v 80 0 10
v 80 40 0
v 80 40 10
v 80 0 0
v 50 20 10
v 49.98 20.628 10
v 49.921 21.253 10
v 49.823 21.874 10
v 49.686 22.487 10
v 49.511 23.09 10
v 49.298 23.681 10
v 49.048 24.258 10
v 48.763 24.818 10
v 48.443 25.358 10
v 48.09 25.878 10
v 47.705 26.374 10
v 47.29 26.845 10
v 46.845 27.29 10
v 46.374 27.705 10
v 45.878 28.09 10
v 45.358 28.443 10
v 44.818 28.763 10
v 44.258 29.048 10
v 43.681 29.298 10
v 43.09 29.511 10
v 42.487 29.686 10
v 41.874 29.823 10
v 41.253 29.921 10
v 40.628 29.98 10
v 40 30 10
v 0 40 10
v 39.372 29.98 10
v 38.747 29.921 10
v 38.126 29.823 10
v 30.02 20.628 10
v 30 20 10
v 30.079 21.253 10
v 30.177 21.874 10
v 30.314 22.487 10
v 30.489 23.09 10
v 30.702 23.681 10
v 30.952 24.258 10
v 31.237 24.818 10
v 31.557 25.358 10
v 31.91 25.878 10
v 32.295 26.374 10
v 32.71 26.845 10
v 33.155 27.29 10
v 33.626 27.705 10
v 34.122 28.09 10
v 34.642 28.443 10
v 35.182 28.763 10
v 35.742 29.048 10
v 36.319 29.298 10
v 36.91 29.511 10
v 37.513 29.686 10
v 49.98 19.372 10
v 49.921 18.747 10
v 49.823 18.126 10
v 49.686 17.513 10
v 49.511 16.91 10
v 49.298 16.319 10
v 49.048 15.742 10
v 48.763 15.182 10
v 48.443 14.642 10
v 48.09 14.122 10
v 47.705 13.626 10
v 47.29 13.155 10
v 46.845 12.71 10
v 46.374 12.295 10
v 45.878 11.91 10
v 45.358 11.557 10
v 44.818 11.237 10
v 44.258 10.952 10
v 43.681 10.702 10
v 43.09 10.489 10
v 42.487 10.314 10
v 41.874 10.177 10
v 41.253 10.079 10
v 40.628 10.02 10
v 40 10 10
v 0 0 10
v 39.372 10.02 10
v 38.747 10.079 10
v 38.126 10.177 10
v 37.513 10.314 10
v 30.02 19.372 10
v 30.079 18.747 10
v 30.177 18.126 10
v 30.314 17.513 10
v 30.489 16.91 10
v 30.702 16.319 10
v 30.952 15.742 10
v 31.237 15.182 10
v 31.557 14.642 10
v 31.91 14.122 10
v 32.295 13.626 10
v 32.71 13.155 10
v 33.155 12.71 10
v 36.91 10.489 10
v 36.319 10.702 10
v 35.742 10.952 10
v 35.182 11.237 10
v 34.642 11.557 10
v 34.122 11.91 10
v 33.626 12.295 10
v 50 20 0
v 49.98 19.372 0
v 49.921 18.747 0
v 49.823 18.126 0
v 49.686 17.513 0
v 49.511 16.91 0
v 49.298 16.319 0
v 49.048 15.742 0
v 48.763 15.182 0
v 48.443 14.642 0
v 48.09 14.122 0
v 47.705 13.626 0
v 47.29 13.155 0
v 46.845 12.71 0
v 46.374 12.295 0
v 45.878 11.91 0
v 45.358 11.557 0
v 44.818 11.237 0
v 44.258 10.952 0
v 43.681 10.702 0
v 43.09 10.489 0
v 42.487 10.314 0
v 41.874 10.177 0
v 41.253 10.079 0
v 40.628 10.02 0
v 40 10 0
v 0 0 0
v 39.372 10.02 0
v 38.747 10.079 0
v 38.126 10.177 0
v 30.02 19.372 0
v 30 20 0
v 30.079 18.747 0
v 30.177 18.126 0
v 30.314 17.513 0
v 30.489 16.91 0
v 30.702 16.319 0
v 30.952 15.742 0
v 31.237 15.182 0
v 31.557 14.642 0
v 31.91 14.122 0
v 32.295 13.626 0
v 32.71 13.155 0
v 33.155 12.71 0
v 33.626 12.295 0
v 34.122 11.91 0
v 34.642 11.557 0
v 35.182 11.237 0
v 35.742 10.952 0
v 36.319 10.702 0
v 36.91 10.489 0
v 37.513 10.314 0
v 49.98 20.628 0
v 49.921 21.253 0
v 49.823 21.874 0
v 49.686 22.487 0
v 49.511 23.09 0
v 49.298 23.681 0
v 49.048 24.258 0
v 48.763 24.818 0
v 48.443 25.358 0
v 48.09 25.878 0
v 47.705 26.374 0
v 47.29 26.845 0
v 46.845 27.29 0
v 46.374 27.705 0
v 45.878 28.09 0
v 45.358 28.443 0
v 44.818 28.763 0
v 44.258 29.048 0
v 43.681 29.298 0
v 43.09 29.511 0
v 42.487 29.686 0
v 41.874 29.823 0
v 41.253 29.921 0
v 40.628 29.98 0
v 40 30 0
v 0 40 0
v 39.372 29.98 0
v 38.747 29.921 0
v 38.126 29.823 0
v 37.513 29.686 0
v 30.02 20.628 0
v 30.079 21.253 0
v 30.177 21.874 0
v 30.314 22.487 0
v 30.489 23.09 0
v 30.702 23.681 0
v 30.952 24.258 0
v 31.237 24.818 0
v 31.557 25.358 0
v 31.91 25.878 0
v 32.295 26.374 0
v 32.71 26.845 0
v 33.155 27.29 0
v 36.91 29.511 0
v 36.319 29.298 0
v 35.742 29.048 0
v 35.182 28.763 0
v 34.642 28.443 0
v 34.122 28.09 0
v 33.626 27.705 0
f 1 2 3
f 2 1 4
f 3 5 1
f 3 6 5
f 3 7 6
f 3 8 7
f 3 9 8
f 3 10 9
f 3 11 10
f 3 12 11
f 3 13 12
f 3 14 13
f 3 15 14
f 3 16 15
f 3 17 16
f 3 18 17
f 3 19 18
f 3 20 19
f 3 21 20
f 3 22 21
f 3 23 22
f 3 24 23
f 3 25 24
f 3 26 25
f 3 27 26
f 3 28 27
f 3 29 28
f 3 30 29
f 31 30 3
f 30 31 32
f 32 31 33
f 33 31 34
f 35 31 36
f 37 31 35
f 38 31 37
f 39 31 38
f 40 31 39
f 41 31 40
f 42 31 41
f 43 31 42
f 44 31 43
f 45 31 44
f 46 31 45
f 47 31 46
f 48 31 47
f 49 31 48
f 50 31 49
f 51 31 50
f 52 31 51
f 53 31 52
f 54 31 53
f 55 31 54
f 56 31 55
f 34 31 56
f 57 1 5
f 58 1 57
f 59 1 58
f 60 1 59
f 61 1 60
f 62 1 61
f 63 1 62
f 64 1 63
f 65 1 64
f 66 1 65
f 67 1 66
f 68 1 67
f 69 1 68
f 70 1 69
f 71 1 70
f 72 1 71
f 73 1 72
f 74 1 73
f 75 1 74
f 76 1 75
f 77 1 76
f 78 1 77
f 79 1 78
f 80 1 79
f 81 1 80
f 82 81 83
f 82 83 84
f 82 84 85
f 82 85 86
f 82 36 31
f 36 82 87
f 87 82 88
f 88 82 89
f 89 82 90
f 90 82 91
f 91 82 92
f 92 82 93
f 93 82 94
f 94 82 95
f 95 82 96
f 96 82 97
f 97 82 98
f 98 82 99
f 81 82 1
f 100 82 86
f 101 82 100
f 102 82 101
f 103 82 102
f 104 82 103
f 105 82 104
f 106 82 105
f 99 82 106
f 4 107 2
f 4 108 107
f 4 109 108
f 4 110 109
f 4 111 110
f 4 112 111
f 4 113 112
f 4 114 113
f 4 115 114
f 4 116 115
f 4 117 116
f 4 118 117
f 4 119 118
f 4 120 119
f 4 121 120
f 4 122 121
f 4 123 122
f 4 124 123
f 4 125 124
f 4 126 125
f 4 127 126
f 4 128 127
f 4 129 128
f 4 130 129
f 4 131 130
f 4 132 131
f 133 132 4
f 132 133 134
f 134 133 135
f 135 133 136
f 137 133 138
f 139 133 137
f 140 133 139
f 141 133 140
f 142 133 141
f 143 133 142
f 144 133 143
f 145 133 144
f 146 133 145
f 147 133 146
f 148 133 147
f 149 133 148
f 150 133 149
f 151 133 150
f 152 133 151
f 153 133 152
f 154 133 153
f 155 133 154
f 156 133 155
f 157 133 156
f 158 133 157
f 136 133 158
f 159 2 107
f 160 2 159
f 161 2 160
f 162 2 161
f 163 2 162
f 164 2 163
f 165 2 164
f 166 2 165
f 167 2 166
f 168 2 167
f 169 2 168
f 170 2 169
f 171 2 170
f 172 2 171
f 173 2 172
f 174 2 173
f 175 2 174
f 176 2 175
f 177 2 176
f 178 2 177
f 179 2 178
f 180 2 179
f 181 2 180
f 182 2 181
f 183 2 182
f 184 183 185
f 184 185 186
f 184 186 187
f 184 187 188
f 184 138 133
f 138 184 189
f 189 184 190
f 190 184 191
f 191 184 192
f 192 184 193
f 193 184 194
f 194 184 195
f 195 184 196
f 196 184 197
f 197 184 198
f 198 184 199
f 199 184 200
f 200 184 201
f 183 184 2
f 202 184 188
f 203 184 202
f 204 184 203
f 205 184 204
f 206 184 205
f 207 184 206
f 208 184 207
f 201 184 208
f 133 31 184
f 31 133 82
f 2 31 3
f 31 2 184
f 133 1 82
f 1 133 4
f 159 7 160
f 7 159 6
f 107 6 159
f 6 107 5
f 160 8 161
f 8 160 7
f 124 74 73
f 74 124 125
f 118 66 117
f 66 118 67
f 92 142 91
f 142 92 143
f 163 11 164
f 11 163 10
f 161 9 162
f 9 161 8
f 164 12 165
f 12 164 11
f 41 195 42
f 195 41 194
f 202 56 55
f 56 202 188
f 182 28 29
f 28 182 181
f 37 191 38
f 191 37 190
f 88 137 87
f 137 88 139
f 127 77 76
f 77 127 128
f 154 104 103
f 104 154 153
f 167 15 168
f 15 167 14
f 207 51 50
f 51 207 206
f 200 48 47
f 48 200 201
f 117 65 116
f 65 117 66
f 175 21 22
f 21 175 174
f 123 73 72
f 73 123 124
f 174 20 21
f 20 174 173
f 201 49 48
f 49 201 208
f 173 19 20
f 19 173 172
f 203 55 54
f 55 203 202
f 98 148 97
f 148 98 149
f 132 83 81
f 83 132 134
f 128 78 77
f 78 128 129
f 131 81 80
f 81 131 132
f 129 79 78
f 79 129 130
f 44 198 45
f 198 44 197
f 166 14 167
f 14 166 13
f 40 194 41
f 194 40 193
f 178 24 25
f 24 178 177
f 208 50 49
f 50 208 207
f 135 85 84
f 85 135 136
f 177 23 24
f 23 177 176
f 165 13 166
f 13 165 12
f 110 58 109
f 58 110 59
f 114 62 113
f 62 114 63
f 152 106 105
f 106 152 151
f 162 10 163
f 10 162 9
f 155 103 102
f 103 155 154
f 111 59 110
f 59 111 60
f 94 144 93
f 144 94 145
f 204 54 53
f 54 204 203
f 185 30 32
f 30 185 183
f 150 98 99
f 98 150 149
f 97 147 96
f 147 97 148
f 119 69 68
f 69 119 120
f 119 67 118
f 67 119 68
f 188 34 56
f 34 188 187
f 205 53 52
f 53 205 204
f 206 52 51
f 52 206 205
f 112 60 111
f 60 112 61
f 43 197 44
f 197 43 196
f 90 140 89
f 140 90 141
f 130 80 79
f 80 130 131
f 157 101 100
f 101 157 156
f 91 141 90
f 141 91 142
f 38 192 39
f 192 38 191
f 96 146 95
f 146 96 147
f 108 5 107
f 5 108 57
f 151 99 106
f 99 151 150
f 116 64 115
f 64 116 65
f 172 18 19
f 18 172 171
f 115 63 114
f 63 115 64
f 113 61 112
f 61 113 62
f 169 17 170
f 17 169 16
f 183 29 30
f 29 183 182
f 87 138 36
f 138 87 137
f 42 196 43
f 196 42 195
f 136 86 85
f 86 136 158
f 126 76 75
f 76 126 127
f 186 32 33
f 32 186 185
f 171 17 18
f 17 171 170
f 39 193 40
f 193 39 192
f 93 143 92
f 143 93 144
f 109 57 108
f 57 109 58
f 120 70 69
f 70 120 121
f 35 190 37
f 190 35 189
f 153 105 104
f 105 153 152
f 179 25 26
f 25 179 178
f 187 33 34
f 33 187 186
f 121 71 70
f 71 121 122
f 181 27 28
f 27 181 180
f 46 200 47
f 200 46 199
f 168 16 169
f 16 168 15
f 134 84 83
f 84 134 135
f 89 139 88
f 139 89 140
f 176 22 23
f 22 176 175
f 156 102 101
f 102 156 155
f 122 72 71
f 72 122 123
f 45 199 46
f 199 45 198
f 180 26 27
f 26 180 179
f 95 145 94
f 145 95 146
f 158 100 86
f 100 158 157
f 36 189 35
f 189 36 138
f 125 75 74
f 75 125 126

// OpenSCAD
$fn = 100;

difference() {
    cube ([80, 40, 10]);
    translate([40, 20, -20])
    cylinder(r=10, h=50);    
}
